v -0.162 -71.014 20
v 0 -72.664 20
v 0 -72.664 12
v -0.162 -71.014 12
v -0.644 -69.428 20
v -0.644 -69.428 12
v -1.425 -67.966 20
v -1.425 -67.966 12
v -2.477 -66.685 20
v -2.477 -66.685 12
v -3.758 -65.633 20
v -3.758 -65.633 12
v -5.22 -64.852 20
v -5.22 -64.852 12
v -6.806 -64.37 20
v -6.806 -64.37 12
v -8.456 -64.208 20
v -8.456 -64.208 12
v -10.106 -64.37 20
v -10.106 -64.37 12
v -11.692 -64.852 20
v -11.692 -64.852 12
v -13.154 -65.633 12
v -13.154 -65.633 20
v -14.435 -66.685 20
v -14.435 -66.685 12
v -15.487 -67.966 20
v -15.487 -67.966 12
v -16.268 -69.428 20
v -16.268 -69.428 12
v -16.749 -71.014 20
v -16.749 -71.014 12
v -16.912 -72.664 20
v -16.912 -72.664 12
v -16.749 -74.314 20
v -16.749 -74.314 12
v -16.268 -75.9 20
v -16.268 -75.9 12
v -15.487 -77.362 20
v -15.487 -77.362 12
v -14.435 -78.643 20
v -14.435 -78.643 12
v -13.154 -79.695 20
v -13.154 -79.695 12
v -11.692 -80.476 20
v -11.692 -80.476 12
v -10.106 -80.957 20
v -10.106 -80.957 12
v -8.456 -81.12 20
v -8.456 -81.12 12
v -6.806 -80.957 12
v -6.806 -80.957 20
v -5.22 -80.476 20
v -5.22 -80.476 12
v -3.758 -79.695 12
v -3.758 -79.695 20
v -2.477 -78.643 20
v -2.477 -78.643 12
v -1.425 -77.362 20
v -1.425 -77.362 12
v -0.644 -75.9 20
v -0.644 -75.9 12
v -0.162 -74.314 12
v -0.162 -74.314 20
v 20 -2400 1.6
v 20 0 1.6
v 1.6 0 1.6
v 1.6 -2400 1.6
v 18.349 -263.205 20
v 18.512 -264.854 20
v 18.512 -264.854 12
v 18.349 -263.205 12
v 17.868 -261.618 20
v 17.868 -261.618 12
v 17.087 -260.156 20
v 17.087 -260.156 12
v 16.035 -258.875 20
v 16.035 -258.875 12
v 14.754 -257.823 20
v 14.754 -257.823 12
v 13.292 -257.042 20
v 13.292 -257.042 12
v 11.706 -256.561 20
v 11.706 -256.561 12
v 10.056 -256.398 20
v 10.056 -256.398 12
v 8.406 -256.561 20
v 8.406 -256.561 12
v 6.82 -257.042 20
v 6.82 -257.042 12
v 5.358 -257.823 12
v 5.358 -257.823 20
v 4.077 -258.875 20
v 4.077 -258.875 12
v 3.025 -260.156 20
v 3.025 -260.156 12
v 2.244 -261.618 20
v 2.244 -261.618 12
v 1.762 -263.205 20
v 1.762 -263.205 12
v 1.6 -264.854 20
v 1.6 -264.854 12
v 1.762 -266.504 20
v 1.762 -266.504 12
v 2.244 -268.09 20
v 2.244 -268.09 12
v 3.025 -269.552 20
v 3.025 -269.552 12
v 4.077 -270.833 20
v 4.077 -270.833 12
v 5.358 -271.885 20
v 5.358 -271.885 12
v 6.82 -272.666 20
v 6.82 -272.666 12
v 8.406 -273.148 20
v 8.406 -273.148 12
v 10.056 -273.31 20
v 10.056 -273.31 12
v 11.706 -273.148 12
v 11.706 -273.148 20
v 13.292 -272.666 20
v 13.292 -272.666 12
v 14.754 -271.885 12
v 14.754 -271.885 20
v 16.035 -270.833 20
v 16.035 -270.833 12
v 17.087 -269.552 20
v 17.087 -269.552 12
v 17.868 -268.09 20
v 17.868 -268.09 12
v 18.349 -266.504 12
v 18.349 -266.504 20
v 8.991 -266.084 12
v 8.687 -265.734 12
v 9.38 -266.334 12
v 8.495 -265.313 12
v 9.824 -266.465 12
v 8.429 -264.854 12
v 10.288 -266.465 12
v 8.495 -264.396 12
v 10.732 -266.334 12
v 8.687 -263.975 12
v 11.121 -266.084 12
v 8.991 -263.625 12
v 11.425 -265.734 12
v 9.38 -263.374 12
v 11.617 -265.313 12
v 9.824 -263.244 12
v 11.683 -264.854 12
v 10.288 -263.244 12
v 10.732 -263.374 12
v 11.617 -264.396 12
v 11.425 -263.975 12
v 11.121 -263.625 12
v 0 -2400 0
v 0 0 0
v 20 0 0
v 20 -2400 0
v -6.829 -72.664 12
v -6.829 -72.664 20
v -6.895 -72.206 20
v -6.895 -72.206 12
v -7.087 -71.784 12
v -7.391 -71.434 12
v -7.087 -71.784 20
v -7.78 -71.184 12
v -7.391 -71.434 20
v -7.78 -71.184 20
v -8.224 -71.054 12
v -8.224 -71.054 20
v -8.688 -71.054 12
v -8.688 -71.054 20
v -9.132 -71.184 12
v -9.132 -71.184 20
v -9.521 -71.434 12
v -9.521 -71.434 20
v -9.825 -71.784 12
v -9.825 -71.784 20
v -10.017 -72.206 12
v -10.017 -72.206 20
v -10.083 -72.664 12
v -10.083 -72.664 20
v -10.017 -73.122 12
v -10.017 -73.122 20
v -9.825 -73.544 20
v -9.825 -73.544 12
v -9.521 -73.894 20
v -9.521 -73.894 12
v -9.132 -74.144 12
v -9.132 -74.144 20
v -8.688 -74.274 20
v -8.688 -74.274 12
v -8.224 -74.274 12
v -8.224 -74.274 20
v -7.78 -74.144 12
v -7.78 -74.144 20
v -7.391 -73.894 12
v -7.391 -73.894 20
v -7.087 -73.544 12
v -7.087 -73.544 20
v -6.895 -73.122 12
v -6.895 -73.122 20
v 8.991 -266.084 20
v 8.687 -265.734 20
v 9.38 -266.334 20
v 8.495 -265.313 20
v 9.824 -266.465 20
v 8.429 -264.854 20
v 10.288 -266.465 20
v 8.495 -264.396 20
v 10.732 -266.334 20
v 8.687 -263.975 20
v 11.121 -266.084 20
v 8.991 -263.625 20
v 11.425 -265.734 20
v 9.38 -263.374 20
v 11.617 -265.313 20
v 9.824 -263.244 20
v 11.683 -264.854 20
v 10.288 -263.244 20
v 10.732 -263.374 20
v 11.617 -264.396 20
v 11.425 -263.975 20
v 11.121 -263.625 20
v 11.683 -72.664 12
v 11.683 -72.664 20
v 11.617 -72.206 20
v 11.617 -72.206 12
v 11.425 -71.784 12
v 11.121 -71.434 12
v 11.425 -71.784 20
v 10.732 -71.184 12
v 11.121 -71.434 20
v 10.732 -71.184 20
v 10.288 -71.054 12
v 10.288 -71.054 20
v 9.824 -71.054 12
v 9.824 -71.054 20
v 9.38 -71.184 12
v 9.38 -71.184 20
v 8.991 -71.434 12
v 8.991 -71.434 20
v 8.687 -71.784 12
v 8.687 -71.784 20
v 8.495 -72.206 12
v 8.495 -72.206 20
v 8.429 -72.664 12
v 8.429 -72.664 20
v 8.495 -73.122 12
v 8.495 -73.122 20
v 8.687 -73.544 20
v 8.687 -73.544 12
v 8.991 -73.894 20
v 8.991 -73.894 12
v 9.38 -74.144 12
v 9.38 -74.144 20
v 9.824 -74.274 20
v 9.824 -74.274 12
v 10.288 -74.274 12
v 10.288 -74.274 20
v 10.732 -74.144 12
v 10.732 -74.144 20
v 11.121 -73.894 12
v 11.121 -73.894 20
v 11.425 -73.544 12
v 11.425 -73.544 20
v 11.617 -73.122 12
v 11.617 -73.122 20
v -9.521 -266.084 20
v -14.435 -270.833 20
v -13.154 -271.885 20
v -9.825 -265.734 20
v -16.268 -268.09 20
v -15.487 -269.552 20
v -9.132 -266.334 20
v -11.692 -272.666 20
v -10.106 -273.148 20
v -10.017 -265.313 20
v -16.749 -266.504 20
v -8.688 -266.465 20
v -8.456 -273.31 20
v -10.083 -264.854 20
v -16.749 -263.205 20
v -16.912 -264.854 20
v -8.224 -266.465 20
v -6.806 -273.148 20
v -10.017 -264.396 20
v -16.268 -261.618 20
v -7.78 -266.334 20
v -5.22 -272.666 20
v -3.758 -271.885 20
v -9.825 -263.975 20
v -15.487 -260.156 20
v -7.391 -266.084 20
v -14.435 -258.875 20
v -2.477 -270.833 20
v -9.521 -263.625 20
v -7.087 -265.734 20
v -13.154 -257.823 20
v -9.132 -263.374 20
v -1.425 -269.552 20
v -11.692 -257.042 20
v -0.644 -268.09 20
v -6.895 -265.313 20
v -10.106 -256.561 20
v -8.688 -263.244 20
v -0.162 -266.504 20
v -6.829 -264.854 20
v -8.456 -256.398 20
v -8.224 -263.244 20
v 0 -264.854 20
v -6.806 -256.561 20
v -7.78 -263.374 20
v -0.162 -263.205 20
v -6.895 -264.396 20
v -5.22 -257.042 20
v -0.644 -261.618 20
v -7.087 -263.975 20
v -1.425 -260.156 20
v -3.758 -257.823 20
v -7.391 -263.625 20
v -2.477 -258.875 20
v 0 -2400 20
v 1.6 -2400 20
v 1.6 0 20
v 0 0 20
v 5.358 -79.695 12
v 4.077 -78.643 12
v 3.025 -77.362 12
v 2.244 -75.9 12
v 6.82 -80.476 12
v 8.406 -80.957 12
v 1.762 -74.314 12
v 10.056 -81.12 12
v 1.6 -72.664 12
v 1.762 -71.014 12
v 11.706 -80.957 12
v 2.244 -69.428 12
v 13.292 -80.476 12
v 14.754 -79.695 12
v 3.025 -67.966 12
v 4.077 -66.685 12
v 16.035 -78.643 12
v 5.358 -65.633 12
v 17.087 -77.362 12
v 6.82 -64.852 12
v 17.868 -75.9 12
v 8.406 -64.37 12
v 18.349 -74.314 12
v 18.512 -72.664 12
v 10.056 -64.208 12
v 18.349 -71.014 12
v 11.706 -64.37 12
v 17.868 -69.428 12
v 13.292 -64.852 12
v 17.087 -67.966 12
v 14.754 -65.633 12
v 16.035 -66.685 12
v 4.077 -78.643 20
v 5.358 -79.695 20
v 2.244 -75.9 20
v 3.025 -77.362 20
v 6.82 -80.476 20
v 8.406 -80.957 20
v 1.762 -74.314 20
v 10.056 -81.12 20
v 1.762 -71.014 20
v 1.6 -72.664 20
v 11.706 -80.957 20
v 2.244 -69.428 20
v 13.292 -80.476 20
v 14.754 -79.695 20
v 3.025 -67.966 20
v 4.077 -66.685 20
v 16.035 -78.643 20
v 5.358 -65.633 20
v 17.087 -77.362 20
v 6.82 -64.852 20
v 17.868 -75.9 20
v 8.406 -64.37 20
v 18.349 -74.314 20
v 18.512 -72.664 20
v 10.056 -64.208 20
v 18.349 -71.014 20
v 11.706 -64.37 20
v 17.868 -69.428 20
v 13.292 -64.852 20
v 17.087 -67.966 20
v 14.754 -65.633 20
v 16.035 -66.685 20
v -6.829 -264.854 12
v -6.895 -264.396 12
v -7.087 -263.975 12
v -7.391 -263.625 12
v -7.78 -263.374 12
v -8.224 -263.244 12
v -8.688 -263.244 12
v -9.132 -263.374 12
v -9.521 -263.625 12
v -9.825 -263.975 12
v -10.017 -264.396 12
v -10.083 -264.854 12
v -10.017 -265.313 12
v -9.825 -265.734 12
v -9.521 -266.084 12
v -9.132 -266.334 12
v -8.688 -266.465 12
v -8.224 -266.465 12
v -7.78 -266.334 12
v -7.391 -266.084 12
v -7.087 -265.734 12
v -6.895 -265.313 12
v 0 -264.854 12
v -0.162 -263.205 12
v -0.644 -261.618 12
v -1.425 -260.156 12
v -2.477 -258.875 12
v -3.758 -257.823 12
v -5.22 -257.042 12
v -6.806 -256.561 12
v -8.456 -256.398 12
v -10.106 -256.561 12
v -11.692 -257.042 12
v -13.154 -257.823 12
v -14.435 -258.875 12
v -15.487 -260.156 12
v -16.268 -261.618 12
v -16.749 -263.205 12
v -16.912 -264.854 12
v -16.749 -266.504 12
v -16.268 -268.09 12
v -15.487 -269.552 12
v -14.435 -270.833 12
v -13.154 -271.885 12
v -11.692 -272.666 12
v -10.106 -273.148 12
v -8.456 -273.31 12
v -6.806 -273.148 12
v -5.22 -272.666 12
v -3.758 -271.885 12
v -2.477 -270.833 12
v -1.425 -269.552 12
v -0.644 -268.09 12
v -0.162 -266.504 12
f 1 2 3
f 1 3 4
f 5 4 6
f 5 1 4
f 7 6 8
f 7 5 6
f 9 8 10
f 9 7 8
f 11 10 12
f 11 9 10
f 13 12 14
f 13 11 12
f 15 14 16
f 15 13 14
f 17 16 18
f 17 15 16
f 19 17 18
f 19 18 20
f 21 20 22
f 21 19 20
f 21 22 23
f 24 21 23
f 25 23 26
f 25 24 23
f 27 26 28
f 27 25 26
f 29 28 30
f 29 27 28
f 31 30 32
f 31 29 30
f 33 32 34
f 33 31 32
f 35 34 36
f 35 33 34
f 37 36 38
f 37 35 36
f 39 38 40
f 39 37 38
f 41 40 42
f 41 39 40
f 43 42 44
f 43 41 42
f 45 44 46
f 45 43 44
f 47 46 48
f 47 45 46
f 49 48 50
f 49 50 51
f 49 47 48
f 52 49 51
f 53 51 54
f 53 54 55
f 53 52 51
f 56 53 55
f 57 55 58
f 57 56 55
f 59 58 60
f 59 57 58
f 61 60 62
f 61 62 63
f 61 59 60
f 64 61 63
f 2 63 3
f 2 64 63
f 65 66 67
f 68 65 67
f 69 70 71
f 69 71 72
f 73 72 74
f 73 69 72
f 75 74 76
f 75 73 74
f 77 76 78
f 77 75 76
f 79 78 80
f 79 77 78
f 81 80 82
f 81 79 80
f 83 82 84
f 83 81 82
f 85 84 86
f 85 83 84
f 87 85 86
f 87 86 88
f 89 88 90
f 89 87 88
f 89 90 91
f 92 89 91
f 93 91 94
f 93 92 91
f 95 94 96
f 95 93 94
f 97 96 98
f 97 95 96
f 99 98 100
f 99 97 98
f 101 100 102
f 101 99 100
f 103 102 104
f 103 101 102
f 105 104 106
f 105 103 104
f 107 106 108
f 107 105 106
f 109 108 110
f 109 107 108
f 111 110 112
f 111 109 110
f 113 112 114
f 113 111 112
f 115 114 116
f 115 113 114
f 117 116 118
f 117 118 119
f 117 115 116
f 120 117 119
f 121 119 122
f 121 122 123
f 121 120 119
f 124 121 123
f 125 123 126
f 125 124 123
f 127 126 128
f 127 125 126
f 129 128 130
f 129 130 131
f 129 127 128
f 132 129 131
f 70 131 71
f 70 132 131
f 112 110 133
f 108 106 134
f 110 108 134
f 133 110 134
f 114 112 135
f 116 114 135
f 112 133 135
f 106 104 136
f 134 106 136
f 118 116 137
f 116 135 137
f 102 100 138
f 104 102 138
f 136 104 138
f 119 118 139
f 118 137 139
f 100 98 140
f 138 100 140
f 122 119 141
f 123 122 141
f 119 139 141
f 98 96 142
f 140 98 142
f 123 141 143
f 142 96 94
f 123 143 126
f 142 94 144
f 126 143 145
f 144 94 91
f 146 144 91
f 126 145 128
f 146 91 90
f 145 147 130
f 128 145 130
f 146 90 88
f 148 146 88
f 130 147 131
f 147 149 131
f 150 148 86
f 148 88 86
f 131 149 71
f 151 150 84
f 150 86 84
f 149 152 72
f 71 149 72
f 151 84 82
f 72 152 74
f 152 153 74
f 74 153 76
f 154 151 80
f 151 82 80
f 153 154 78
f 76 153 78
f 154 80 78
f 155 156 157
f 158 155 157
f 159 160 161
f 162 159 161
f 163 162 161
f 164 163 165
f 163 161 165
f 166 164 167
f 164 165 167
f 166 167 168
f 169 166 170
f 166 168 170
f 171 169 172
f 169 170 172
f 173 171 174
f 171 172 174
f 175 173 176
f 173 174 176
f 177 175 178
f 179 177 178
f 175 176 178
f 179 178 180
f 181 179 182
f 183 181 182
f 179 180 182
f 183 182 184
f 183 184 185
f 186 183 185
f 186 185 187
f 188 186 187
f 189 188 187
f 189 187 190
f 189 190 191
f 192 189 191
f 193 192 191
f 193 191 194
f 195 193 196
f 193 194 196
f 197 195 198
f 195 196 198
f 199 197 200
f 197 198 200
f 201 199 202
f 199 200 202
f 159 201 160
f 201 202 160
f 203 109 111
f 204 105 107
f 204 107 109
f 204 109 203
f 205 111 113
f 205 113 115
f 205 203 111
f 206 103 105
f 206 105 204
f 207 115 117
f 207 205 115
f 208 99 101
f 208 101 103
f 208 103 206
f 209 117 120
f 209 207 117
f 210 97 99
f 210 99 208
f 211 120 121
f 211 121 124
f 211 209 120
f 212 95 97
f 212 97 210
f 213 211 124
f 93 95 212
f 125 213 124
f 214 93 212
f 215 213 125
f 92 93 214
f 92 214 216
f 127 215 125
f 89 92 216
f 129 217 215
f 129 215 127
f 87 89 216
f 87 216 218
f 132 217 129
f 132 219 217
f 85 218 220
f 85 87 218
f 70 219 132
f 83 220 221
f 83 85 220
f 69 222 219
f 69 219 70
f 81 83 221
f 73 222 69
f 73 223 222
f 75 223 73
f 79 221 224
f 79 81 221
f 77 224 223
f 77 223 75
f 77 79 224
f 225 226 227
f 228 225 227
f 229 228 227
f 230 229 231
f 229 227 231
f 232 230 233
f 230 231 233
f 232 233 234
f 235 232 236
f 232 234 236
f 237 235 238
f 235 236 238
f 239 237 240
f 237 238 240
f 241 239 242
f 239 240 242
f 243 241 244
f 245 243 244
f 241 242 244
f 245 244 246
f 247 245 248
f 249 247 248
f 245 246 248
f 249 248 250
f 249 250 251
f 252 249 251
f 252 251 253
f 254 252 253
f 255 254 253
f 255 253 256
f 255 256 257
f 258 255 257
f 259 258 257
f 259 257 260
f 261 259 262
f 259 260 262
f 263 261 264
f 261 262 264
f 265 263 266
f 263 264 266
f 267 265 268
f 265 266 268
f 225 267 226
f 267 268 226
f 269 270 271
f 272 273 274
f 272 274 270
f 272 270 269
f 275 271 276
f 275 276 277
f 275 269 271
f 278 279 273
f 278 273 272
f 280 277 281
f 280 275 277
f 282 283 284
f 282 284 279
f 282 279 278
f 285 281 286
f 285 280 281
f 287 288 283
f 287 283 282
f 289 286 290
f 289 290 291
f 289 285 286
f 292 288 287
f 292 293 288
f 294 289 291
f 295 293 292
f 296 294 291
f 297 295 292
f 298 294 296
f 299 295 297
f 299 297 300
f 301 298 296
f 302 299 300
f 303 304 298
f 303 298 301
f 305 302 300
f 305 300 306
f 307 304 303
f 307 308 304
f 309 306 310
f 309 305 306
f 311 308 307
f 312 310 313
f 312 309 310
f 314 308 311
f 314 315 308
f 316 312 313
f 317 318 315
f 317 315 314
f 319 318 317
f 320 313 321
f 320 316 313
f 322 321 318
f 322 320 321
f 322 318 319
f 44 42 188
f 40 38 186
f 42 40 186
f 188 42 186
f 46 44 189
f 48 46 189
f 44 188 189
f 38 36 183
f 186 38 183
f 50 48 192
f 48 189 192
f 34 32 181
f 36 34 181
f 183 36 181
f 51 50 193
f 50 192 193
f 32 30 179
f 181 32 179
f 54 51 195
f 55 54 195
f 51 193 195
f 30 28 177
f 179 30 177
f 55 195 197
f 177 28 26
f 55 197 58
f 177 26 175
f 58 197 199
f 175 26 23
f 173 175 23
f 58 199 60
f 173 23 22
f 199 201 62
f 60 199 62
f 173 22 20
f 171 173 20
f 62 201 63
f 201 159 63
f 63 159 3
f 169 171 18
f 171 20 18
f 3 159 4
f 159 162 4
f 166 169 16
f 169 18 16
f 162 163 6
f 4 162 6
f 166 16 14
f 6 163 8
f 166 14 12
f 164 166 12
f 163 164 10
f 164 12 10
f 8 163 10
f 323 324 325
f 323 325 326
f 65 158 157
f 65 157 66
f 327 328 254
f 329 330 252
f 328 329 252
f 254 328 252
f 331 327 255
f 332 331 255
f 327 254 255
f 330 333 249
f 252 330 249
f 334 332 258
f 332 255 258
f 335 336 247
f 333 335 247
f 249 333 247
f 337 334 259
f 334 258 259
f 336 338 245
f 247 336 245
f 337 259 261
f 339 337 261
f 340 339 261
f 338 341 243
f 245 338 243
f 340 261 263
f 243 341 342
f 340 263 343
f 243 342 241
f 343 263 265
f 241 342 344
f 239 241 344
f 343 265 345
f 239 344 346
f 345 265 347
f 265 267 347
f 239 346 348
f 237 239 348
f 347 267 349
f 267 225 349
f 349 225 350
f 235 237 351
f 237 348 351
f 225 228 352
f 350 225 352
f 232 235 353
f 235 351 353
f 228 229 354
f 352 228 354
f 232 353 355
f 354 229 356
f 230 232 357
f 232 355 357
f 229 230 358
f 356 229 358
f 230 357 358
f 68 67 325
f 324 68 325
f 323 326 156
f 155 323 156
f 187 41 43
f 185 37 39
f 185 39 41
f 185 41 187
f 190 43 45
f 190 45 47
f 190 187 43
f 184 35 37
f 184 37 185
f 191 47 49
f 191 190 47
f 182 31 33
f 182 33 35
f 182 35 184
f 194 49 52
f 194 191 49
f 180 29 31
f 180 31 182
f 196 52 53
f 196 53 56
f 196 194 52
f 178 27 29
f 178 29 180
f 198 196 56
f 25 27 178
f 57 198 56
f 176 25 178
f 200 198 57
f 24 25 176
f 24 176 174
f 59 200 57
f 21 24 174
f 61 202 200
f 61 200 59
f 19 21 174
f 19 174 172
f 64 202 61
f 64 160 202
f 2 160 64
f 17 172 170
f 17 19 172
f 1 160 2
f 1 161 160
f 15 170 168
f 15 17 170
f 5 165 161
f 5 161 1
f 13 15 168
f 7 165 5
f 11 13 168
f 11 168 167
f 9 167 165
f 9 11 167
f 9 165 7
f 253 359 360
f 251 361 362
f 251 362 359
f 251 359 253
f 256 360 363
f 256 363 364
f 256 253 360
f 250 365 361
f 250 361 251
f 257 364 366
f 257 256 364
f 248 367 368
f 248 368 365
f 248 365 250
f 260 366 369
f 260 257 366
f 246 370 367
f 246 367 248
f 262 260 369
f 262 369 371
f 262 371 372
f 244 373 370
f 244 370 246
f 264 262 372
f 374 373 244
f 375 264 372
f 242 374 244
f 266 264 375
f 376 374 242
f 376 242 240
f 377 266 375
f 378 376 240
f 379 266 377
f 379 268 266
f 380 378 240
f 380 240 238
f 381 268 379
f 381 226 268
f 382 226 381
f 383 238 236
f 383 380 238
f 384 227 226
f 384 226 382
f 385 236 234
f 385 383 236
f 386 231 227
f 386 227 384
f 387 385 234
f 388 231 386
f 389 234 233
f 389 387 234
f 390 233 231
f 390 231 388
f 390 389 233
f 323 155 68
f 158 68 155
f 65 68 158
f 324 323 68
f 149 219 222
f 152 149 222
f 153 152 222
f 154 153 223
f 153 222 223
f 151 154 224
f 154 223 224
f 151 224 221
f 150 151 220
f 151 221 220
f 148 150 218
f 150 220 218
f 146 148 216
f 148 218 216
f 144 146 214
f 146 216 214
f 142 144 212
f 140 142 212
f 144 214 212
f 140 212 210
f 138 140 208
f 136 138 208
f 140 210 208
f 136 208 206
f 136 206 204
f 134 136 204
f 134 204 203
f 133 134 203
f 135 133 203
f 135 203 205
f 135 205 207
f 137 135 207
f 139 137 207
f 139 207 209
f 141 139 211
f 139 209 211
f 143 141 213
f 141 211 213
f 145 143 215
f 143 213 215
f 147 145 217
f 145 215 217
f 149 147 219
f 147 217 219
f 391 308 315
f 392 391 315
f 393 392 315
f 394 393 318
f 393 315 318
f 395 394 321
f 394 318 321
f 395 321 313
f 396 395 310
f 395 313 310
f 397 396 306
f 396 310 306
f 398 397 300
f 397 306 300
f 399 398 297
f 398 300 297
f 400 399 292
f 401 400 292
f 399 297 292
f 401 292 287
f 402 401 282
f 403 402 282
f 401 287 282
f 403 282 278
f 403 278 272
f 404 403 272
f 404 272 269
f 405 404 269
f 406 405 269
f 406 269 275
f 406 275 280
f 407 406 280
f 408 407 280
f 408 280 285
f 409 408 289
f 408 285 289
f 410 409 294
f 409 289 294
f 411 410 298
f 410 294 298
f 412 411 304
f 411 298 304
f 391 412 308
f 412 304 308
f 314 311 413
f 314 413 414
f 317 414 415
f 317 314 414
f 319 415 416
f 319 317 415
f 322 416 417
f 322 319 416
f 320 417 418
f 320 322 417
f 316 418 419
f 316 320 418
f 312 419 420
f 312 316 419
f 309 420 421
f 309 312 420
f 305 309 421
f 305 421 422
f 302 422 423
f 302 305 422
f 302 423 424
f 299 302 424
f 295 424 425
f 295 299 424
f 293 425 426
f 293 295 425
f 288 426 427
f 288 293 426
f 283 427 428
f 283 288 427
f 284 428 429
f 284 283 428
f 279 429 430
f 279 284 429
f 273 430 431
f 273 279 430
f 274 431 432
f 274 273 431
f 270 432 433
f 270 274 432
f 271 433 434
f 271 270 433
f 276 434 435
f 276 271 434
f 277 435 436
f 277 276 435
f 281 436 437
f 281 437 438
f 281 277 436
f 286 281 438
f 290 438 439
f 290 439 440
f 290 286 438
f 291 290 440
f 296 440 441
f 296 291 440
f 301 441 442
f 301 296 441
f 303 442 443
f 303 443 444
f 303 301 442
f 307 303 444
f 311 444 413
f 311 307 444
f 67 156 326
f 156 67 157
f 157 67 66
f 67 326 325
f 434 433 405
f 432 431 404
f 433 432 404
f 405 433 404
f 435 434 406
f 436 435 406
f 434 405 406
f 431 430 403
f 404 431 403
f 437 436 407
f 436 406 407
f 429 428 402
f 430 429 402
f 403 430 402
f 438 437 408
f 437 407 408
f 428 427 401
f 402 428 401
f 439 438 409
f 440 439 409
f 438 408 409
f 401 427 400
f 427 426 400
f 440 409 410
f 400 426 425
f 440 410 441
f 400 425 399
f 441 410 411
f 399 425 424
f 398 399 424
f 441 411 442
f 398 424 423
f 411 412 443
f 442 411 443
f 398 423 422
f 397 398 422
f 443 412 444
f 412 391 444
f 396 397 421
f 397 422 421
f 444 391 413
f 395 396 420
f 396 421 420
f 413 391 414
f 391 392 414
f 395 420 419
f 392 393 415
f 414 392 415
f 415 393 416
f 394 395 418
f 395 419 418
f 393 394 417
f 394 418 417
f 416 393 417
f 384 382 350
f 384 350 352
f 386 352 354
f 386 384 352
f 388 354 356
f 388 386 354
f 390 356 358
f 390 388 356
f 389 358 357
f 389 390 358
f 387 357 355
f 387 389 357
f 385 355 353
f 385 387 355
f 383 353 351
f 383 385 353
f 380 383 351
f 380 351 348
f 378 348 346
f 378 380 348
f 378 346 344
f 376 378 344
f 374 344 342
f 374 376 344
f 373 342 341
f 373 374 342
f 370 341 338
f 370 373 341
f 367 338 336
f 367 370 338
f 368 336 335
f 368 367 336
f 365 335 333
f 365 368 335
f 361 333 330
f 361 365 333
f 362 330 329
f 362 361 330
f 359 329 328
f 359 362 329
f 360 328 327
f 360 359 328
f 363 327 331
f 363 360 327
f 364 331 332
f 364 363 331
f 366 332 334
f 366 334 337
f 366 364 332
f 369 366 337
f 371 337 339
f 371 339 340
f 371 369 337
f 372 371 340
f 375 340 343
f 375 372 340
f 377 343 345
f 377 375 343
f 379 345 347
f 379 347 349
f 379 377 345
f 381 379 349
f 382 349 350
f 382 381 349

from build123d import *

# Parameters (mm, degrees)
F1_DEPTH = 2400
F2_R     = 8.455967
F2_R_2   = 1.626978
F3_DEPTH = 8


with BuildPart() as f1:
    # F0 (on Front) → F1 (new body)
    with BuildSketch(Plane.XZ):
        Polygon((0, 20), (0, 0), (20, 0), (20, 1.6), (1.6, 1.6), (1.6, 20), align=None)
    extrude(amount=F1_DEPTH)


with BuildPart() as f3:
    # F2 (on face) → F3 (new body)
    with BuildSketch(Plane.XY.offset(20)):
        with Locations((-8.455967, -264.854193)):
            Circle(F2_R)
        with Locations((-8.455967, -264.854193)):
            Circle(F2_R_2, mode=Mode.SUBTRACT)
        with Locations((10.055967, -264.854193)):
            Circle(F2_R)
        with Locations((10.055967, -264.854193)):
            Circle(F2_R_2, mode=Mode.SUBTRACT)
        with Locations((-8.455967, -72.663933)):
            Circle(F2_R)
        with Locations((-8.455967, -72.663933)):
            Circle(F2_R_2, mode=Mode.SUBTRACT)
        with Locations((10.055967, -72.663933)):
            Circle(F2_R)
        with Locations((10.055967, -72.663933)):
            Circle(F2_R_2, mode=Mode.SUBTRACT)
    extrude(amount=-F3_DEPTH)


solid = Compound([f1.part, f3.part])
